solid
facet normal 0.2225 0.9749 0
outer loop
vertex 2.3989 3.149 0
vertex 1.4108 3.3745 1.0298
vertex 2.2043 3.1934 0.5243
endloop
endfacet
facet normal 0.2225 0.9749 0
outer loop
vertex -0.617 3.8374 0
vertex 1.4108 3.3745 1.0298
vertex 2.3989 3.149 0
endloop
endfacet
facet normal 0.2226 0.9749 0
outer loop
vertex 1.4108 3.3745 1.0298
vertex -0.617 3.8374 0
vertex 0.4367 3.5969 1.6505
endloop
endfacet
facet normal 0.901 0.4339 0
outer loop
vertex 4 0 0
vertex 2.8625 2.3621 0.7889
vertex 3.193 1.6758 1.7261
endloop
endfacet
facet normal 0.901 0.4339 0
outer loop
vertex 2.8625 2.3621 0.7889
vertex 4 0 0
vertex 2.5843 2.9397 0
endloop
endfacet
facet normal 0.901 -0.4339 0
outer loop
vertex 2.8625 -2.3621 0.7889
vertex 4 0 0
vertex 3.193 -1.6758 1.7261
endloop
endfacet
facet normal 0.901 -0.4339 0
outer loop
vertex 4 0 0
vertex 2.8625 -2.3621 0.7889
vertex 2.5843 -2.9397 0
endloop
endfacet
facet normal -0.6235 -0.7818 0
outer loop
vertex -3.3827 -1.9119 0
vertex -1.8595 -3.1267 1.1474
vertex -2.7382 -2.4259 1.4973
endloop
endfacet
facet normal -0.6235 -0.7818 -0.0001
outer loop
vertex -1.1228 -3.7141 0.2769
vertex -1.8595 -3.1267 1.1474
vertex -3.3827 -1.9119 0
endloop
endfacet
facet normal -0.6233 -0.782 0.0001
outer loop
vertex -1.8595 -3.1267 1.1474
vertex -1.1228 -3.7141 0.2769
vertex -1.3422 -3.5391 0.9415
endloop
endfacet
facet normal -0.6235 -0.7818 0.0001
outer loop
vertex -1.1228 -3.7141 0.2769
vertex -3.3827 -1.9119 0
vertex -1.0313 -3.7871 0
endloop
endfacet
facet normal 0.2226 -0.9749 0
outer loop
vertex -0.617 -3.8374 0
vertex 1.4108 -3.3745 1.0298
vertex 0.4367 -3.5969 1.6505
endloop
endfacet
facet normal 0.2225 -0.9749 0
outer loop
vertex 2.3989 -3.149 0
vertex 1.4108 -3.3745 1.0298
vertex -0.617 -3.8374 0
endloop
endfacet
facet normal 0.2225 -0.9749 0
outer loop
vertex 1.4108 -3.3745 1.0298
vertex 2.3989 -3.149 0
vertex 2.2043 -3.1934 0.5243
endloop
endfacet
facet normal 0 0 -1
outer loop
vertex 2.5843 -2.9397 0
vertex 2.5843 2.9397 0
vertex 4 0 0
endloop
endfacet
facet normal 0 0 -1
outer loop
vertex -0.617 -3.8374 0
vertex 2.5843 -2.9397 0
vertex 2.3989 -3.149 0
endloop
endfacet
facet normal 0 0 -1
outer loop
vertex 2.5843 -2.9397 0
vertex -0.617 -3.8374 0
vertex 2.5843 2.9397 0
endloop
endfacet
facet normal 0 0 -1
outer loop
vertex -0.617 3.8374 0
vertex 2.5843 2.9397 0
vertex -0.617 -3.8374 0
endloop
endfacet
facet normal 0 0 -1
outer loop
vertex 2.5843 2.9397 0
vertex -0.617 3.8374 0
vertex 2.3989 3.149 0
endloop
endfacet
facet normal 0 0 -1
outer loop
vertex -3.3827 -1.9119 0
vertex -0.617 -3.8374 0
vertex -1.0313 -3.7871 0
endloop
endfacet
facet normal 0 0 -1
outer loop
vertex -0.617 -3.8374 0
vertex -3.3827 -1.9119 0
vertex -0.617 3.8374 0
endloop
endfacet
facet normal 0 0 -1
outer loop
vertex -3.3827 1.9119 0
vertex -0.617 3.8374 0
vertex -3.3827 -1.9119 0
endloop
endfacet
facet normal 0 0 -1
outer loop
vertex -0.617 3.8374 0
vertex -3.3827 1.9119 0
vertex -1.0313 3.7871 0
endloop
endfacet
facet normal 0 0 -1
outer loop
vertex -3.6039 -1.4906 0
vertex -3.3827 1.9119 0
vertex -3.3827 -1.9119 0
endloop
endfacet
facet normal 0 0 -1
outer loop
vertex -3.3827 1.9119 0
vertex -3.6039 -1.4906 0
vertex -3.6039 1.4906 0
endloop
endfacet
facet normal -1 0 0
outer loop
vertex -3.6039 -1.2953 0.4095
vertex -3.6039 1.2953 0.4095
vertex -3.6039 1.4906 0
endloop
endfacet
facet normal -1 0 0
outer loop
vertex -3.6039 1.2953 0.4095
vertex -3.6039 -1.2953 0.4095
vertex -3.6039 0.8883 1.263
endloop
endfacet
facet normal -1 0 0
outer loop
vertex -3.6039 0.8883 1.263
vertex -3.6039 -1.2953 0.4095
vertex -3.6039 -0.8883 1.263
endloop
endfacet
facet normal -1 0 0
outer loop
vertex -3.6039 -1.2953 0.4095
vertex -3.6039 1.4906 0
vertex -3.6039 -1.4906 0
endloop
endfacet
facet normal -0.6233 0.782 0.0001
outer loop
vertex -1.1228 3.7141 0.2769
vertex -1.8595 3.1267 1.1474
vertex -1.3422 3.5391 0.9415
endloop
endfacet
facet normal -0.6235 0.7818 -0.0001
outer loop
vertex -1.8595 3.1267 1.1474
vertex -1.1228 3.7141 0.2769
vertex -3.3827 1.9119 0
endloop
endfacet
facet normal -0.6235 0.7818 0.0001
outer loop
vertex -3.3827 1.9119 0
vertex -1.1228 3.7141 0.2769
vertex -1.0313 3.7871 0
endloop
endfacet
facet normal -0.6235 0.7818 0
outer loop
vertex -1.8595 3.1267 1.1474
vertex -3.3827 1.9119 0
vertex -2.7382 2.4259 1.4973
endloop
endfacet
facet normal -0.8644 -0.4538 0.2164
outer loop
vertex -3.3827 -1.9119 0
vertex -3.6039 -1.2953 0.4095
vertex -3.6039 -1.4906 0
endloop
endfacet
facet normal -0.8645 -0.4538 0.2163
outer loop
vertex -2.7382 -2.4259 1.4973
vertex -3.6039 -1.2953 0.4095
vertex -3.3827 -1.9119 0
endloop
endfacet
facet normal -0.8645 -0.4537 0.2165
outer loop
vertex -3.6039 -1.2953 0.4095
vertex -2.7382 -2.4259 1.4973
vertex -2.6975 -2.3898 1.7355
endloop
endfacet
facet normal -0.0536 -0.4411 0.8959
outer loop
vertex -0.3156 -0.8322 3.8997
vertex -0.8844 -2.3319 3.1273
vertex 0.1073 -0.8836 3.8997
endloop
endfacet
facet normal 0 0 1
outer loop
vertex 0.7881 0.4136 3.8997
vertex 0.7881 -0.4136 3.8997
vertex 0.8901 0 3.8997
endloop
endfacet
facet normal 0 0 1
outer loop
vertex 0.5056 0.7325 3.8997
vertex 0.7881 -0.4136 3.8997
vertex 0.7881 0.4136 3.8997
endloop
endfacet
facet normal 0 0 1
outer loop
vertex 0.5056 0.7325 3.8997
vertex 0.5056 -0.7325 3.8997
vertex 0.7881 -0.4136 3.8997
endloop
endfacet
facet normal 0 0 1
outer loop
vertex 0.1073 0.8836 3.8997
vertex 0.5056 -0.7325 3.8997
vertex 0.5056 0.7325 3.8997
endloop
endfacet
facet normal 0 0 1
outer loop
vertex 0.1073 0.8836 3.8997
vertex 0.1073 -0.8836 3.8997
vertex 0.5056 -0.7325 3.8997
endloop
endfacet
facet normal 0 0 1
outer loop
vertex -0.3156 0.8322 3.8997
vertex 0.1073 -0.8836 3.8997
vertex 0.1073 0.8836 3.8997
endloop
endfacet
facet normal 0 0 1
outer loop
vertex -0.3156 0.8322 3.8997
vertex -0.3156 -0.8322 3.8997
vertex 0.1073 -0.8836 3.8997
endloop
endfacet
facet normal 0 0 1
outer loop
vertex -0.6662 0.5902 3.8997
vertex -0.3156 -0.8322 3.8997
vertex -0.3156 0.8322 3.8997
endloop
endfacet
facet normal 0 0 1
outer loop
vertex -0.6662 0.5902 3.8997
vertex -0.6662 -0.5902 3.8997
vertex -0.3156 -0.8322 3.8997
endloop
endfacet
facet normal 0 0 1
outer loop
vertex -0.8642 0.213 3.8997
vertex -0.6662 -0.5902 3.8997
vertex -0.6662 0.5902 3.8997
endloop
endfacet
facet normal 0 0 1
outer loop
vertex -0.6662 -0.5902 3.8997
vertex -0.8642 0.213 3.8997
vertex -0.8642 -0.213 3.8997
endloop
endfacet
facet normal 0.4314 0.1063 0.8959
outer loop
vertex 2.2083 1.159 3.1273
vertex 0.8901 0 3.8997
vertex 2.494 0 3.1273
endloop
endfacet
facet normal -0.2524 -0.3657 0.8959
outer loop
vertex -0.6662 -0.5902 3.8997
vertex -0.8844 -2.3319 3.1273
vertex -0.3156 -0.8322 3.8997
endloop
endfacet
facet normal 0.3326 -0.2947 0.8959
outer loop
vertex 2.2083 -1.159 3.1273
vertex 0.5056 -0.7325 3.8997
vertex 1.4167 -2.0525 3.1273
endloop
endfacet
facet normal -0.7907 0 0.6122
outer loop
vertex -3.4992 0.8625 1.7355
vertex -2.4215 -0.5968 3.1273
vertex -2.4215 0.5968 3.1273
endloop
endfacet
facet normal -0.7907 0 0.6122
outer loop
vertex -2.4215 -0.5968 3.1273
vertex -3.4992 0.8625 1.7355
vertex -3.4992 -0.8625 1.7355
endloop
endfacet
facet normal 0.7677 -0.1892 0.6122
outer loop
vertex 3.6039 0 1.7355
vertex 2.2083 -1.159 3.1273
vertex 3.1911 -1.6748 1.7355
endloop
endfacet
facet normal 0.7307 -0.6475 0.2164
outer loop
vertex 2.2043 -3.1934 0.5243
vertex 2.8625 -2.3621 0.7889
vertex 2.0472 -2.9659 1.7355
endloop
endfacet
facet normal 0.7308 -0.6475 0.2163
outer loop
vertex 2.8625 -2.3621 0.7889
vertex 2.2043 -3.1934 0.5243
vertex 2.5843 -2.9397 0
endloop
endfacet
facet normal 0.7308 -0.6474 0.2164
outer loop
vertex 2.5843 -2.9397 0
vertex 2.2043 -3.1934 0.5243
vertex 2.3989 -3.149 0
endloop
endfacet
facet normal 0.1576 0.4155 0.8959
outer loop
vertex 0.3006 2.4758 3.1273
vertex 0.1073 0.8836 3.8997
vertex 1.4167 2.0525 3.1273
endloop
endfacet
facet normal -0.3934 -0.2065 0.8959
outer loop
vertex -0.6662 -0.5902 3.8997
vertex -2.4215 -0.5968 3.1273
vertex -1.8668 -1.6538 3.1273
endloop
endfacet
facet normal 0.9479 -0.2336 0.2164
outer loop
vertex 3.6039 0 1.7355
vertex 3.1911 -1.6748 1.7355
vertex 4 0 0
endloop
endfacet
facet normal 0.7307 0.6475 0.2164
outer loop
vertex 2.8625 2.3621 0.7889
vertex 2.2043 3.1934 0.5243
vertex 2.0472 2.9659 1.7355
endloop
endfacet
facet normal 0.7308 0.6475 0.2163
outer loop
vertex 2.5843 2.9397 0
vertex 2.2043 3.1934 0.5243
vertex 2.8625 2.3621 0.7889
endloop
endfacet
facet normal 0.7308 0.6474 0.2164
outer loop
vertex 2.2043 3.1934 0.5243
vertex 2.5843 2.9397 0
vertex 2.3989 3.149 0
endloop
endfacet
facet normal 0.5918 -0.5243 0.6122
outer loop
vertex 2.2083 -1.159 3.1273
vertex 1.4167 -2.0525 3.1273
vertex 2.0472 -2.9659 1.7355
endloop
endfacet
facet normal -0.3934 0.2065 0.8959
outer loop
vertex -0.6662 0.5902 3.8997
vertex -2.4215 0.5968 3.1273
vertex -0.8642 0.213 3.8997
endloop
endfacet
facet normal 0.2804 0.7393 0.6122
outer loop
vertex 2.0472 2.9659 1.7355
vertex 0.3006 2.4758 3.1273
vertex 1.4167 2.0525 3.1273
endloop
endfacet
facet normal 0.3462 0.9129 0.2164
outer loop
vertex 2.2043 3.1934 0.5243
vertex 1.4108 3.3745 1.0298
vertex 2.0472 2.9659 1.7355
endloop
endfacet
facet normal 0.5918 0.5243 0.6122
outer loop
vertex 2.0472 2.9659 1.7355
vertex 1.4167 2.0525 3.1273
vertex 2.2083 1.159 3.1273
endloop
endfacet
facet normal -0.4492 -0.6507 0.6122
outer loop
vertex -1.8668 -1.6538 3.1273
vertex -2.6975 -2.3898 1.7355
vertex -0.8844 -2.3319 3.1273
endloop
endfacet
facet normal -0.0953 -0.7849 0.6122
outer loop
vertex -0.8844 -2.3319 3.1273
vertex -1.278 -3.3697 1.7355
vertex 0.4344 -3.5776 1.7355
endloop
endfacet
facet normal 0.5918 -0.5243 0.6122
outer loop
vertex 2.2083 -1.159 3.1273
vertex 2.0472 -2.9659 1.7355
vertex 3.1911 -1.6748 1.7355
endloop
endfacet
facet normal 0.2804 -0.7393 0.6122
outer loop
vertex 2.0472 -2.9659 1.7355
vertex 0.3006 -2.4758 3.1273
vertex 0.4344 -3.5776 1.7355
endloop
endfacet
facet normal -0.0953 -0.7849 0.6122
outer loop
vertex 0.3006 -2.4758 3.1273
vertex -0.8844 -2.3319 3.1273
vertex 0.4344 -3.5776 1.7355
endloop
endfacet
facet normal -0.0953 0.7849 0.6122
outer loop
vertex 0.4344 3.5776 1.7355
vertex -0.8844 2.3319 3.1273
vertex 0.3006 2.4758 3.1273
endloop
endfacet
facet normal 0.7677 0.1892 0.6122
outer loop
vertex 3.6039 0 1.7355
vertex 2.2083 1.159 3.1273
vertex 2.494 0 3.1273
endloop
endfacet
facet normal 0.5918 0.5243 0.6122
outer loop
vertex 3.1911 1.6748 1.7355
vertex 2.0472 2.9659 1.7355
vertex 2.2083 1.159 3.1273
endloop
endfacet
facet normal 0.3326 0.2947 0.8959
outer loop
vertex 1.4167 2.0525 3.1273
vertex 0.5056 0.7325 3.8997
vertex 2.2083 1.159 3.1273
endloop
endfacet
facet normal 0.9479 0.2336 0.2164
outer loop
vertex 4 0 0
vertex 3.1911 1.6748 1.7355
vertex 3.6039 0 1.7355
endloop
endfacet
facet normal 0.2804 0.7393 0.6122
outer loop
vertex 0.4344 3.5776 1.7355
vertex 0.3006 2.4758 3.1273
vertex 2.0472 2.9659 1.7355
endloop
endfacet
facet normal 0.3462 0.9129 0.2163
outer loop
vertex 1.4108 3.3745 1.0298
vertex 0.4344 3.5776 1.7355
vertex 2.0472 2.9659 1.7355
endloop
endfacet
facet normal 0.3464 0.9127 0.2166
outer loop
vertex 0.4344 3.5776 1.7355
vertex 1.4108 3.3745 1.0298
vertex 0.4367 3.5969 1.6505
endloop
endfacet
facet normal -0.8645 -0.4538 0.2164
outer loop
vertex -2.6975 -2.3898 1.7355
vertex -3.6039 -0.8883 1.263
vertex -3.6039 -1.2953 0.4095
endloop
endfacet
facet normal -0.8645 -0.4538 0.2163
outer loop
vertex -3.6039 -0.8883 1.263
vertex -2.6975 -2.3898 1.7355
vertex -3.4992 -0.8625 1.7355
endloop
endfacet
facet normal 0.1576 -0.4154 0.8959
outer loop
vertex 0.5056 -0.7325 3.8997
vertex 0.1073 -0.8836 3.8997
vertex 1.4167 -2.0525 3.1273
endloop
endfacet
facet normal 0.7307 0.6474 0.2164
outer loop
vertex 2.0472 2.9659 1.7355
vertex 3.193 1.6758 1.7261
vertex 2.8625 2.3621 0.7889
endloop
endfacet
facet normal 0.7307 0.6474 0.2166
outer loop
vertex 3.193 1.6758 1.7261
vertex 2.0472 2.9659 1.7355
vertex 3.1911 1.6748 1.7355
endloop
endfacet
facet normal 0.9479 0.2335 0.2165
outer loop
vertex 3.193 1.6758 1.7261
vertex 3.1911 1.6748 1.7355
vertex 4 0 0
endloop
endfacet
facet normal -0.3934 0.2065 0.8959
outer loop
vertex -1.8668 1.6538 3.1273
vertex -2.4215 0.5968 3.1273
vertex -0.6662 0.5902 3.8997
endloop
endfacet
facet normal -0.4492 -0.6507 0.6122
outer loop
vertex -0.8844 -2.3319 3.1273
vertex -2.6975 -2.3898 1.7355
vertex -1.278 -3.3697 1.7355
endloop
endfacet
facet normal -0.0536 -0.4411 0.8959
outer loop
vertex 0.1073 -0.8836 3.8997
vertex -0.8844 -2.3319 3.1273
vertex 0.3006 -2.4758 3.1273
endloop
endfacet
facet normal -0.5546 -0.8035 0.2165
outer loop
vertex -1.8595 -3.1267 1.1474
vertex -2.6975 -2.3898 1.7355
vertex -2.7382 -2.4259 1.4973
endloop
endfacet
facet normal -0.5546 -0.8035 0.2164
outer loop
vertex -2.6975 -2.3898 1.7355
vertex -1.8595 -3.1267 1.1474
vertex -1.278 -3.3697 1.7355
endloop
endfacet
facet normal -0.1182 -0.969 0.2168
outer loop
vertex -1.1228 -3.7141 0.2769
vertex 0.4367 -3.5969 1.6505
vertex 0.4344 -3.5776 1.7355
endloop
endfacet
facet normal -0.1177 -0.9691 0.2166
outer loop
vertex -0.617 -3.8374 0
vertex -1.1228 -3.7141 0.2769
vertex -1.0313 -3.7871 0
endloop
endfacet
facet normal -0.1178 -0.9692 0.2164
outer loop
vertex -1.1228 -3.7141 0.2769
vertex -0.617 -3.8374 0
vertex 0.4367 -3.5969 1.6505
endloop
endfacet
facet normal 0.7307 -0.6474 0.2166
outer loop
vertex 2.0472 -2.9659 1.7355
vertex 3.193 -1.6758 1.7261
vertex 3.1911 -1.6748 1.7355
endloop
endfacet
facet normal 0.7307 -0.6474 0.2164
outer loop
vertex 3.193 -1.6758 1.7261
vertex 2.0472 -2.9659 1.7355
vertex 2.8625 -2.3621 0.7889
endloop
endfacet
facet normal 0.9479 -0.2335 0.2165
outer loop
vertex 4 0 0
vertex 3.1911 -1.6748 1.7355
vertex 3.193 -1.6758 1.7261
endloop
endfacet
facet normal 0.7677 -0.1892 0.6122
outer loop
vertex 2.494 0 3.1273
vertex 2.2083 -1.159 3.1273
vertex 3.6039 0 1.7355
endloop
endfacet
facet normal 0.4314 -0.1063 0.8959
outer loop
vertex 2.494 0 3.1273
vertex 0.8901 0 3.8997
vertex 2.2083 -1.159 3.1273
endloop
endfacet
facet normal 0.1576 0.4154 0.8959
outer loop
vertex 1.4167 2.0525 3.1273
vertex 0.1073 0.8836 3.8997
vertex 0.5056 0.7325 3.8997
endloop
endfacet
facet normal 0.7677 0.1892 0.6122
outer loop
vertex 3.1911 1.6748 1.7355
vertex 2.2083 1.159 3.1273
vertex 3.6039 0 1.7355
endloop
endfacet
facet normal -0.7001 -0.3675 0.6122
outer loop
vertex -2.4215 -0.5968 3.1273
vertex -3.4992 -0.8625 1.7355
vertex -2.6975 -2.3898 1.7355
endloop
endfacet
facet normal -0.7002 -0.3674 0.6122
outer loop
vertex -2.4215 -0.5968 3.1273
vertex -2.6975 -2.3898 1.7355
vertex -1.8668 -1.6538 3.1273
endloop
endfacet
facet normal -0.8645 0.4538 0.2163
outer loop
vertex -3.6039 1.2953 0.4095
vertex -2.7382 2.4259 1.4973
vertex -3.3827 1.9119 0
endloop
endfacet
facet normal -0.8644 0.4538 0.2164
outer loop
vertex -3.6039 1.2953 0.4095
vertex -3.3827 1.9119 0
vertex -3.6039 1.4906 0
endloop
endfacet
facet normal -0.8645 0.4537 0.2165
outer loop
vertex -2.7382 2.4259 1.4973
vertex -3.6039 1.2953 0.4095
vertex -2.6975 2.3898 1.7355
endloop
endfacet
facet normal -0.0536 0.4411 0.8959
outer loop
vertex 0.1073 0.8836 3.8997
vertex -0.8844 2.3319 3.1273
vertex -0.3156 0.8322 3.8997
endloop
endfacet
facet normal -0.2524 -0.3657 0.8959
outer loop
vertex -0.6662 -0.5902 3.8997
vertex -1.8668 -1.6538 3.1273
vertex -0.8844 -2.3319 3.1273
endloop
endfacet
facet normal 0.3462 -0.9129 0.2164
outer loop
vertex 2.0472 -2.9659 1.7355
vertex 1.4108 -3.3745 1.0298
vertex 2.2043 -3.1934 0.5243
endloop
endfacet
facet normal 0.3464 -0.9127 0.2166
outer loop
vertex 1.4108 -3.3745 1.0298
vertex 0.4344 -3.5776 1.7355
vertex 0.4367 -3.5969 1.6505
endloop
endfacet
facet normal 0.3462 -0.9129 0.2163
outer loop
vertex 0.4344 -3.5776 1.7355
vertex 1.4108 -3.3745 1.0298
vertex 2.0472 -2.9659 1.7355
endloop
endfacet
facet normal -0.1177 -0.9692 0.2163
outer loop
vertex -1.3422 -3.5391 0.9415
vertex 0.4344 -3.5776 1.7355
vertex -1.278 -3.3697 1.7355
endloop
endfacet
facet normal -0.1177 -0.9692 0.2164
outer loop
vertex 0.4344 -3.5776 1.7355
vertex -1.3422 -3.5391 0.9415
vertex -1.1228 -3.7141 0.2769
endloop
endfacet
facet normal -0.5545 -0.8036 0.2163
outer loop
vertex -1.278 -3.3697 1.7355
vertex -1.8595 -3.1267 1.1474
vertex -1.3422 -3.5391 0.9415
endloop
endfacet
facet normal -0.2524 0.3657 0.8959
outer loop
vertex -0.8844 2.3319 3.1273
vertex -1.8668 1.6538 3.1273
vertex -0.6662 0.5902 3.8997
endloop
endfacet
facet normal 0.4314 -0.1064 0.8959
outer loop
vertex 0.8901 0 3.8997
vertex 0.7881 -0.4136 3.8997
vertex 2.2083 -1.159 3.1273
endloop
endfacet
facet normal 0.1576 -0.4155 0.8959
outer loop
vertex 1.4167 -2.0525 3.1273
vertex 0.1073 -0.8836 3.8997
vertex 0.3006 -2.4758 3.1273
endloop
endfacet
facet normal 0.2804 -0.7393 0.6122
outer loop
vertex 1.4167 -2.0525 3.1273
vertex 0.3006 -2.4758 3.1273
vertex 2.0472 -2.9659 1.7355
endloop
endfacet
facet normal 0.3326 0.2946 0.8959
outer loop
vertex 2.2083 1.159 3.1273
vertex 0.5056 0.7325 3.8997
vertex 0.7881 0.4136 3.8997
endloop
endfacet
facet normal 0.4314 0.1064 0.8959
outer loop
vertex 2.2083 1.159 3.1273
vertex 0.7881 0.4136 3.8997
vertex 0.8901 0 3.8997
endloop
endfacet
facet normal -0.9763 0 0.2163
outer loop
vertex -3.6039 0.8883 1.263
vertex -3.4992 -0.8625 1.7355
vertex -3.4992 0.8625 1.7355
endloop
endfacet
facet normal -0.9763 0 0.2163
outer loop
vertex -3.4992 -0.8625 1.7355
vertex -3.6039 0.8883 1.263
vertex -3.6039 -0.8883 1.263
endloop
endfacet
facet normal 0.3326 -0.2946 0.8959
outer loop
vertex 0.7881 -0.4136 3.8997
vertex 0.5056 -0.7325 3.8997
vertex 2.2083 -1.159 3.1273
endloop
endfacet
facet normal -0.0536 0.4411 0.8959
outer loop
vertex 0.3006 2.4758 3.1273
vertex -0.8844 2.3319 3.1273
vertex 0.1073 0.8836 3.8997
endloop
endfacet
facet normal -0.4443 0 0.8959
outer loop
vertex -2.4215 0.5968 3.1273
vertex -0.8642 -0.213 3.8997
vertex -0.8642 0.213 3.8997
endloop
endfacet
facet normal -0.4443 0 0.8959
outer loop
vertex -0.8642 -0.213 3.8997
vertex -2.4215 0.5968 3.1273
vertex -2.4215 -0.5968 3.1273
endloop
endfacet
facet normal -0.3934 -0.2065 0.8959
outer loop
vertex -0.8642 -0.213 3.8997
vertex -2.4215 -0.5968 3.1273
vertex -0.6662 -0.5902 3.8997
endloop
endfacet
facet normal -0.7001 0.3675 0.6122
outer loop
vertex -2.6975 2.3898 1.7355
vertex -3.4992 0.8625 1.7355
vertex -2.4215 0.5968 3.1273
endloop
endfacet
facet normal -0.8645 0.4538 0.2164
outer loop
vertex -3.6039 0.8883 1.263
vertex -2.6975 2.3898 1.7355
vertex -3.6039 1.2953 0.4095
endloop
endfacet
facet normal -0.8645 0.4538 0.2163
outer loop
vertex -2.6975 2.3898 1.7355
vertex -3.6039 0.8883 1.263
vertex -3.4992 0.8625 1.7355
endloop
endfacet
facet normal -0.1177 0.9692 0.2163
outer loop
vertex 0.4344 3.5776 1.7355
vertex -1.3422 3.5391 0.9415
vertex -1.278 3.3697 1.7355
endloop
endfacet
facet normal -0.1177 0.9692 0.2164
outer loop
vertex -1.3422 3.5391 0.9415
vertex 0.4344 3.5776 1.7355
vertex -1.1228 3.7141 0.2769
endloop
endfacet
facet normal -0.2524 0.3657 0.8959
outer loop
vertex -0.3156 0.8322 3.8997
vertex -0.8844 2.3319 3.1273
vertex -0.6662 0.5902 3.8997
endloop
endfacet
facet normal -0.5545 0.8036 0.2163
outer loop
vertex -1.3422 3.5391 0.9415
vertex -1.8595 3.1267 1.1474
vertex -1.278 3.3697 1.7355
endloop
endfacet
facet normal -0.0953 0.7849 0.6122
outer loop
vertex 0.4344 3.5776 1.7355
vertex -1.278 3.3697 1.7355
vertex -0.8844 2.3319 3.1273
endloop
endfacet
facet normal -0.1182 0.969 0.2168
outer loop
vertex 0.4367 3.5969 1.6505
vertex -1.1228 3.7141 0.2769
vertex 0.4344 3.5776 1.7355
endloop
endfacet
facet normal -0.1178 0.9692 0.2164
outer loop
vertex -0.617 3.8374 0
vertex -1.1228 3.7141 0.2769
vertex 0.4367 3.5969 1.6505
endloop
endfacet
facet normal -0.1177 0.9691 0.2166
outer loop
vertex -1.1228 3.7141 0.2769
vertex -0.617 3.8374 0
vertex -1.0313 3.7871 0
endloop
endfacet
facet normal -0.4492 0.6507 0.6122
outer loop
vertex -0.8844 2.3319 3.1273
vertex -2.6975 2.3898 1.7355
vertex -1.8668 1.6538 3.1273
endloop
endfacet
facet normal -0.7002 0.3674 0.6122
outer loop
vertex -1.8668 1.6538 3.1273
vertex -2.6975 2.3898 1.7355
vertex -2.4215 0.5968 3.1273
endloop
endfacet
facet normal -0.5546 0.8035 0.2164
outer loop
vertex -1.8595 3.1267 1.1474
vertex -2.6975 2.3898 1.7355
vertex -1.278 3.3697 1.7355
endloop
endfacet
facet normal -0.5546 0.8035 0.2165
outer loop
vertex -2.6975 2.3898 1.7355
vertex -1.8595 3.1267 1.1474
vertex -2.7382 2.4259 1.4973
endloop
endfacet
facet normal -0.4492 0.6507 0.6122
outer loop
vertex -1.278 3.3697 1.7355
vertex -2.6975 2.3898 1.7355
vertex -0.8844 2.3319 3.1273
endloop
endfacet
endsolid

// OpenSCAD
// Generated by generate_scads.py
intersection() {
  scale([2.0,2.0,1.0]) {
    cylinder(h=30, r=2, center=false);
  }
  sphere(r=12);
  sphere(r=10);
  union() {
    sphere(r=4);
  }
}
